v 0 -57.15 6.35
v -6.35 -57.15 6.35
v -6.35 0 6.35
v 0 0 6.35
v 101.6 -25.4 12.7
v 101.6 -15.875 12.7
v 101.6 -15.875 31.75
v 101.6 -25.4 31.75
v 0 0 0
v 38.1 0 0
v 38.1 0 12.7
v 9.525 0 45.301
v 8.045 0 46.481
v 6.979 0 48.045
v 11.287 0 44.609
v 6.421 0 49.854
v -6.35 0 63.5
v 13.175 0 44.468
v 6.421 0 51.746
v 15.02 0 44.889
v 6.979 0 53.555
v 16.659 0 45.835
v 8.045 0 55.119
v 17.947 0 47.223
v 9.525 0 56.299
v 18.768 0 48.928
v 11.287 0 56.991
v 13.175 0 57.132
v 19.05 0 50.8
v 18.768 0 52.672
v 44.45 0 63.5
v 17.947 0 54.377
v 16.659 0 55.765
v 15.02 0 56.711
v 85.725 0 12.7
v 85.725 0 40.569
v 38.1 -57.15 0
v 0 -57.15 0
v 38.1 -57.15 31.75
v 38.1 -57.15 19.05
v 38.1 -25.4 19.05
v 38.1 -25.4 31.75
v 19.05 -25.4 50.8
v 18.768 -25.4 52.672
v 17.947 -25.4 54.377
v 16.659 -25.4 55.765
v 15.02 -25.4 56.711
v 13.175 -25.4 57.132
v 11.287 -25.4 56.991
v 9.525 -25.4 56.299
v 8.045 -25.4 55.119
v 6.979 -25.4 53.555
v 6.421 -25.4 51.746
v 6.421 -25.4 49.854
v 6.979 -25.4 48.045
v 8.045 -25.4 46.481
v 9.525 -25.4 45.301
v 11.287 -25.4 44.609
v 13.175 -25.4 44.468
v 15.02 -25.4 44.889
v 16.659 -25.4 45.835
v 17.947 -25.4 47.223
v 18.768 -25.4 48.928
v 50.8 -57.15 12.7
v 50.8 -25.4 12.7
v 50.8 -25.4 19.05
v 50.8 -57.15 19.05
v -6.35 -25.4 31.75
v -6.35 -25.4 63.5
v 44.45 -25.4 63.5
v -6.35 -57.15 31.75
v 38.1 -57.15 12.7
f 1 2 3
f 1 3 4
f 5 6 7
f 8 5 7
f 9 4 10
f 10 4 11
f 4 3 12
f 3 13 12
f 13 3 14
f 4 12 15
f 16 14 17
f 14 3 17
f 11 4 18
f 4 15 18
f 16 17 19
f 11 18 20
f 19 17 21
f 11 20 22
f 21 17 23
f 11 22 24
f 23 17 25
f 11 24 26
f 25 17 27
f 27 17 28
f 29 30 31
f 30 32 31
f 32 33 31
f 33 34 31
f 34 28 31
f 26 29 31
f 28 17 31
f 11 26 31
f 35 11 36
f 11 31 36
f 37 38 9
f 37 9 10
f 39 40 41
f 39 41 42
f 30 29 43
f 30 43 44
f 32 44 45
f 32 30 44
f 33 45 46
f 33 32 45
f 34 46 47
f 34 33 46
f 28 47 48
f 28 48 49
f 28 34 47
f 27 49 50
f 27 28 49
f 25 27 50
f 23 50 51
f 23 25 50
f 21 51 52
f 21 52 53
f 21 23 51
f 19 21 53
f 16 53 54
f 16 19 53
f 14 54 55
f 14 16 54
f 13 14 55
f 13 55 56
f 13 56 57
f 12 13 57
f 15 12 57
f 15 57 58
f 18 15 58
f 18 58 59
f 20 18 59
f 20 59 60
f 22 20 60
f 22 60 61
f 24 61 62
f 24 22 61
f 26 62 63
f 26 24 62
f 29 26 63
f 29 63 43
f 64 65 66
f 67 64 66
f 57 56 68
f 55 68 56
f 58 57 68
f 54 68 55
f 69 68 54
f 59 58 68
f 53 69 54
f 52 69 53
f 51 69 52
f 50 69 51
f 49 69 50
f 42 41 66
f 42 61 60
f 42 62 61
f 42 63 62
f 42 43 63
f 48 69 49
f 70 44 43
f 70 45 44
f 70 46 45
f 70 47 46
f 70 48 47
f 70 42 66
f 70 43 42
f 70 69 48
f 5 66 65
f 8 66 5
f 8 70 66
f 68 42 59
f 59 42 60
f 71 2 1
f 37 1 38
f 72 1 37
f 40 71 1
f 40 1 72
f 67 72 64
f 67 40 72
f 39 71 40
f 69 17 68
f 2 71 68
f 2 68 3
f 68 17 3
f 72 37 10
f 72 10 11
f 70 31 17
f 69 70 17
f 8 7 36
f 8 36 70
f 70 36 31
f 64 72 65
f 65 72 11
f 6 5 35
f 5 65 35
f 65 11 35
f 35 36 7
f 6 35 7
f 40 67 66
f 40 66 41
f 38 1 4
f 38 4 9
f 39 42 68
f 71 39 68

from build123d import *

# Parameters (mm, degrees)
F1_DEPTH = 57.15
F0_R     = 6.35
F2_DEPTH = 25.4
F4_DEPTH = 63.501


with BuildPart() as f1:
    # F0 (on Front) → F1 (new body)
    with BuildSketch(Plane.XZ):
        Polygon((0, 6.35), (0, 0), (38.1, 0), (38.1, 12.7), (50.8, 12.7), (50.8, 19.05), (38.1, 19.05), (38.1, 31.75), (-6.35, 31.75), (-6.35, 6.35), align=None)
    extrude(amount=F1_DEPTH)

    # F0 (on Front) → F2 (join)
    with BuildSketch(Plane.XZ):
        Polygon((-6.35, 63.5), (-6.35, 31.75), (38.1, 31.75), (38.1, 19.05), (50.8, 19.05), (50.8, 12.7), (101.6, 12.7), (101.6, 31.75), (44.45, 63.5), align=None)
        with Locations((12.7, 50.8)):
            Circle(F0_R, mode=Mode.SUBTRACT)
    extrude(amount=F2_DEPTH)

    # F3 (on face) → F4 (cut, through all)
    with BuildSketch(Plane.XY.offset(63.5)):
        Polygon((101.6, 0), (85.725, 0), (101.6, -15.875), align=None)
    extrude(amount=-F4_DEPTH, mode=Mode.SUBTRACT)


solid = f1.part
